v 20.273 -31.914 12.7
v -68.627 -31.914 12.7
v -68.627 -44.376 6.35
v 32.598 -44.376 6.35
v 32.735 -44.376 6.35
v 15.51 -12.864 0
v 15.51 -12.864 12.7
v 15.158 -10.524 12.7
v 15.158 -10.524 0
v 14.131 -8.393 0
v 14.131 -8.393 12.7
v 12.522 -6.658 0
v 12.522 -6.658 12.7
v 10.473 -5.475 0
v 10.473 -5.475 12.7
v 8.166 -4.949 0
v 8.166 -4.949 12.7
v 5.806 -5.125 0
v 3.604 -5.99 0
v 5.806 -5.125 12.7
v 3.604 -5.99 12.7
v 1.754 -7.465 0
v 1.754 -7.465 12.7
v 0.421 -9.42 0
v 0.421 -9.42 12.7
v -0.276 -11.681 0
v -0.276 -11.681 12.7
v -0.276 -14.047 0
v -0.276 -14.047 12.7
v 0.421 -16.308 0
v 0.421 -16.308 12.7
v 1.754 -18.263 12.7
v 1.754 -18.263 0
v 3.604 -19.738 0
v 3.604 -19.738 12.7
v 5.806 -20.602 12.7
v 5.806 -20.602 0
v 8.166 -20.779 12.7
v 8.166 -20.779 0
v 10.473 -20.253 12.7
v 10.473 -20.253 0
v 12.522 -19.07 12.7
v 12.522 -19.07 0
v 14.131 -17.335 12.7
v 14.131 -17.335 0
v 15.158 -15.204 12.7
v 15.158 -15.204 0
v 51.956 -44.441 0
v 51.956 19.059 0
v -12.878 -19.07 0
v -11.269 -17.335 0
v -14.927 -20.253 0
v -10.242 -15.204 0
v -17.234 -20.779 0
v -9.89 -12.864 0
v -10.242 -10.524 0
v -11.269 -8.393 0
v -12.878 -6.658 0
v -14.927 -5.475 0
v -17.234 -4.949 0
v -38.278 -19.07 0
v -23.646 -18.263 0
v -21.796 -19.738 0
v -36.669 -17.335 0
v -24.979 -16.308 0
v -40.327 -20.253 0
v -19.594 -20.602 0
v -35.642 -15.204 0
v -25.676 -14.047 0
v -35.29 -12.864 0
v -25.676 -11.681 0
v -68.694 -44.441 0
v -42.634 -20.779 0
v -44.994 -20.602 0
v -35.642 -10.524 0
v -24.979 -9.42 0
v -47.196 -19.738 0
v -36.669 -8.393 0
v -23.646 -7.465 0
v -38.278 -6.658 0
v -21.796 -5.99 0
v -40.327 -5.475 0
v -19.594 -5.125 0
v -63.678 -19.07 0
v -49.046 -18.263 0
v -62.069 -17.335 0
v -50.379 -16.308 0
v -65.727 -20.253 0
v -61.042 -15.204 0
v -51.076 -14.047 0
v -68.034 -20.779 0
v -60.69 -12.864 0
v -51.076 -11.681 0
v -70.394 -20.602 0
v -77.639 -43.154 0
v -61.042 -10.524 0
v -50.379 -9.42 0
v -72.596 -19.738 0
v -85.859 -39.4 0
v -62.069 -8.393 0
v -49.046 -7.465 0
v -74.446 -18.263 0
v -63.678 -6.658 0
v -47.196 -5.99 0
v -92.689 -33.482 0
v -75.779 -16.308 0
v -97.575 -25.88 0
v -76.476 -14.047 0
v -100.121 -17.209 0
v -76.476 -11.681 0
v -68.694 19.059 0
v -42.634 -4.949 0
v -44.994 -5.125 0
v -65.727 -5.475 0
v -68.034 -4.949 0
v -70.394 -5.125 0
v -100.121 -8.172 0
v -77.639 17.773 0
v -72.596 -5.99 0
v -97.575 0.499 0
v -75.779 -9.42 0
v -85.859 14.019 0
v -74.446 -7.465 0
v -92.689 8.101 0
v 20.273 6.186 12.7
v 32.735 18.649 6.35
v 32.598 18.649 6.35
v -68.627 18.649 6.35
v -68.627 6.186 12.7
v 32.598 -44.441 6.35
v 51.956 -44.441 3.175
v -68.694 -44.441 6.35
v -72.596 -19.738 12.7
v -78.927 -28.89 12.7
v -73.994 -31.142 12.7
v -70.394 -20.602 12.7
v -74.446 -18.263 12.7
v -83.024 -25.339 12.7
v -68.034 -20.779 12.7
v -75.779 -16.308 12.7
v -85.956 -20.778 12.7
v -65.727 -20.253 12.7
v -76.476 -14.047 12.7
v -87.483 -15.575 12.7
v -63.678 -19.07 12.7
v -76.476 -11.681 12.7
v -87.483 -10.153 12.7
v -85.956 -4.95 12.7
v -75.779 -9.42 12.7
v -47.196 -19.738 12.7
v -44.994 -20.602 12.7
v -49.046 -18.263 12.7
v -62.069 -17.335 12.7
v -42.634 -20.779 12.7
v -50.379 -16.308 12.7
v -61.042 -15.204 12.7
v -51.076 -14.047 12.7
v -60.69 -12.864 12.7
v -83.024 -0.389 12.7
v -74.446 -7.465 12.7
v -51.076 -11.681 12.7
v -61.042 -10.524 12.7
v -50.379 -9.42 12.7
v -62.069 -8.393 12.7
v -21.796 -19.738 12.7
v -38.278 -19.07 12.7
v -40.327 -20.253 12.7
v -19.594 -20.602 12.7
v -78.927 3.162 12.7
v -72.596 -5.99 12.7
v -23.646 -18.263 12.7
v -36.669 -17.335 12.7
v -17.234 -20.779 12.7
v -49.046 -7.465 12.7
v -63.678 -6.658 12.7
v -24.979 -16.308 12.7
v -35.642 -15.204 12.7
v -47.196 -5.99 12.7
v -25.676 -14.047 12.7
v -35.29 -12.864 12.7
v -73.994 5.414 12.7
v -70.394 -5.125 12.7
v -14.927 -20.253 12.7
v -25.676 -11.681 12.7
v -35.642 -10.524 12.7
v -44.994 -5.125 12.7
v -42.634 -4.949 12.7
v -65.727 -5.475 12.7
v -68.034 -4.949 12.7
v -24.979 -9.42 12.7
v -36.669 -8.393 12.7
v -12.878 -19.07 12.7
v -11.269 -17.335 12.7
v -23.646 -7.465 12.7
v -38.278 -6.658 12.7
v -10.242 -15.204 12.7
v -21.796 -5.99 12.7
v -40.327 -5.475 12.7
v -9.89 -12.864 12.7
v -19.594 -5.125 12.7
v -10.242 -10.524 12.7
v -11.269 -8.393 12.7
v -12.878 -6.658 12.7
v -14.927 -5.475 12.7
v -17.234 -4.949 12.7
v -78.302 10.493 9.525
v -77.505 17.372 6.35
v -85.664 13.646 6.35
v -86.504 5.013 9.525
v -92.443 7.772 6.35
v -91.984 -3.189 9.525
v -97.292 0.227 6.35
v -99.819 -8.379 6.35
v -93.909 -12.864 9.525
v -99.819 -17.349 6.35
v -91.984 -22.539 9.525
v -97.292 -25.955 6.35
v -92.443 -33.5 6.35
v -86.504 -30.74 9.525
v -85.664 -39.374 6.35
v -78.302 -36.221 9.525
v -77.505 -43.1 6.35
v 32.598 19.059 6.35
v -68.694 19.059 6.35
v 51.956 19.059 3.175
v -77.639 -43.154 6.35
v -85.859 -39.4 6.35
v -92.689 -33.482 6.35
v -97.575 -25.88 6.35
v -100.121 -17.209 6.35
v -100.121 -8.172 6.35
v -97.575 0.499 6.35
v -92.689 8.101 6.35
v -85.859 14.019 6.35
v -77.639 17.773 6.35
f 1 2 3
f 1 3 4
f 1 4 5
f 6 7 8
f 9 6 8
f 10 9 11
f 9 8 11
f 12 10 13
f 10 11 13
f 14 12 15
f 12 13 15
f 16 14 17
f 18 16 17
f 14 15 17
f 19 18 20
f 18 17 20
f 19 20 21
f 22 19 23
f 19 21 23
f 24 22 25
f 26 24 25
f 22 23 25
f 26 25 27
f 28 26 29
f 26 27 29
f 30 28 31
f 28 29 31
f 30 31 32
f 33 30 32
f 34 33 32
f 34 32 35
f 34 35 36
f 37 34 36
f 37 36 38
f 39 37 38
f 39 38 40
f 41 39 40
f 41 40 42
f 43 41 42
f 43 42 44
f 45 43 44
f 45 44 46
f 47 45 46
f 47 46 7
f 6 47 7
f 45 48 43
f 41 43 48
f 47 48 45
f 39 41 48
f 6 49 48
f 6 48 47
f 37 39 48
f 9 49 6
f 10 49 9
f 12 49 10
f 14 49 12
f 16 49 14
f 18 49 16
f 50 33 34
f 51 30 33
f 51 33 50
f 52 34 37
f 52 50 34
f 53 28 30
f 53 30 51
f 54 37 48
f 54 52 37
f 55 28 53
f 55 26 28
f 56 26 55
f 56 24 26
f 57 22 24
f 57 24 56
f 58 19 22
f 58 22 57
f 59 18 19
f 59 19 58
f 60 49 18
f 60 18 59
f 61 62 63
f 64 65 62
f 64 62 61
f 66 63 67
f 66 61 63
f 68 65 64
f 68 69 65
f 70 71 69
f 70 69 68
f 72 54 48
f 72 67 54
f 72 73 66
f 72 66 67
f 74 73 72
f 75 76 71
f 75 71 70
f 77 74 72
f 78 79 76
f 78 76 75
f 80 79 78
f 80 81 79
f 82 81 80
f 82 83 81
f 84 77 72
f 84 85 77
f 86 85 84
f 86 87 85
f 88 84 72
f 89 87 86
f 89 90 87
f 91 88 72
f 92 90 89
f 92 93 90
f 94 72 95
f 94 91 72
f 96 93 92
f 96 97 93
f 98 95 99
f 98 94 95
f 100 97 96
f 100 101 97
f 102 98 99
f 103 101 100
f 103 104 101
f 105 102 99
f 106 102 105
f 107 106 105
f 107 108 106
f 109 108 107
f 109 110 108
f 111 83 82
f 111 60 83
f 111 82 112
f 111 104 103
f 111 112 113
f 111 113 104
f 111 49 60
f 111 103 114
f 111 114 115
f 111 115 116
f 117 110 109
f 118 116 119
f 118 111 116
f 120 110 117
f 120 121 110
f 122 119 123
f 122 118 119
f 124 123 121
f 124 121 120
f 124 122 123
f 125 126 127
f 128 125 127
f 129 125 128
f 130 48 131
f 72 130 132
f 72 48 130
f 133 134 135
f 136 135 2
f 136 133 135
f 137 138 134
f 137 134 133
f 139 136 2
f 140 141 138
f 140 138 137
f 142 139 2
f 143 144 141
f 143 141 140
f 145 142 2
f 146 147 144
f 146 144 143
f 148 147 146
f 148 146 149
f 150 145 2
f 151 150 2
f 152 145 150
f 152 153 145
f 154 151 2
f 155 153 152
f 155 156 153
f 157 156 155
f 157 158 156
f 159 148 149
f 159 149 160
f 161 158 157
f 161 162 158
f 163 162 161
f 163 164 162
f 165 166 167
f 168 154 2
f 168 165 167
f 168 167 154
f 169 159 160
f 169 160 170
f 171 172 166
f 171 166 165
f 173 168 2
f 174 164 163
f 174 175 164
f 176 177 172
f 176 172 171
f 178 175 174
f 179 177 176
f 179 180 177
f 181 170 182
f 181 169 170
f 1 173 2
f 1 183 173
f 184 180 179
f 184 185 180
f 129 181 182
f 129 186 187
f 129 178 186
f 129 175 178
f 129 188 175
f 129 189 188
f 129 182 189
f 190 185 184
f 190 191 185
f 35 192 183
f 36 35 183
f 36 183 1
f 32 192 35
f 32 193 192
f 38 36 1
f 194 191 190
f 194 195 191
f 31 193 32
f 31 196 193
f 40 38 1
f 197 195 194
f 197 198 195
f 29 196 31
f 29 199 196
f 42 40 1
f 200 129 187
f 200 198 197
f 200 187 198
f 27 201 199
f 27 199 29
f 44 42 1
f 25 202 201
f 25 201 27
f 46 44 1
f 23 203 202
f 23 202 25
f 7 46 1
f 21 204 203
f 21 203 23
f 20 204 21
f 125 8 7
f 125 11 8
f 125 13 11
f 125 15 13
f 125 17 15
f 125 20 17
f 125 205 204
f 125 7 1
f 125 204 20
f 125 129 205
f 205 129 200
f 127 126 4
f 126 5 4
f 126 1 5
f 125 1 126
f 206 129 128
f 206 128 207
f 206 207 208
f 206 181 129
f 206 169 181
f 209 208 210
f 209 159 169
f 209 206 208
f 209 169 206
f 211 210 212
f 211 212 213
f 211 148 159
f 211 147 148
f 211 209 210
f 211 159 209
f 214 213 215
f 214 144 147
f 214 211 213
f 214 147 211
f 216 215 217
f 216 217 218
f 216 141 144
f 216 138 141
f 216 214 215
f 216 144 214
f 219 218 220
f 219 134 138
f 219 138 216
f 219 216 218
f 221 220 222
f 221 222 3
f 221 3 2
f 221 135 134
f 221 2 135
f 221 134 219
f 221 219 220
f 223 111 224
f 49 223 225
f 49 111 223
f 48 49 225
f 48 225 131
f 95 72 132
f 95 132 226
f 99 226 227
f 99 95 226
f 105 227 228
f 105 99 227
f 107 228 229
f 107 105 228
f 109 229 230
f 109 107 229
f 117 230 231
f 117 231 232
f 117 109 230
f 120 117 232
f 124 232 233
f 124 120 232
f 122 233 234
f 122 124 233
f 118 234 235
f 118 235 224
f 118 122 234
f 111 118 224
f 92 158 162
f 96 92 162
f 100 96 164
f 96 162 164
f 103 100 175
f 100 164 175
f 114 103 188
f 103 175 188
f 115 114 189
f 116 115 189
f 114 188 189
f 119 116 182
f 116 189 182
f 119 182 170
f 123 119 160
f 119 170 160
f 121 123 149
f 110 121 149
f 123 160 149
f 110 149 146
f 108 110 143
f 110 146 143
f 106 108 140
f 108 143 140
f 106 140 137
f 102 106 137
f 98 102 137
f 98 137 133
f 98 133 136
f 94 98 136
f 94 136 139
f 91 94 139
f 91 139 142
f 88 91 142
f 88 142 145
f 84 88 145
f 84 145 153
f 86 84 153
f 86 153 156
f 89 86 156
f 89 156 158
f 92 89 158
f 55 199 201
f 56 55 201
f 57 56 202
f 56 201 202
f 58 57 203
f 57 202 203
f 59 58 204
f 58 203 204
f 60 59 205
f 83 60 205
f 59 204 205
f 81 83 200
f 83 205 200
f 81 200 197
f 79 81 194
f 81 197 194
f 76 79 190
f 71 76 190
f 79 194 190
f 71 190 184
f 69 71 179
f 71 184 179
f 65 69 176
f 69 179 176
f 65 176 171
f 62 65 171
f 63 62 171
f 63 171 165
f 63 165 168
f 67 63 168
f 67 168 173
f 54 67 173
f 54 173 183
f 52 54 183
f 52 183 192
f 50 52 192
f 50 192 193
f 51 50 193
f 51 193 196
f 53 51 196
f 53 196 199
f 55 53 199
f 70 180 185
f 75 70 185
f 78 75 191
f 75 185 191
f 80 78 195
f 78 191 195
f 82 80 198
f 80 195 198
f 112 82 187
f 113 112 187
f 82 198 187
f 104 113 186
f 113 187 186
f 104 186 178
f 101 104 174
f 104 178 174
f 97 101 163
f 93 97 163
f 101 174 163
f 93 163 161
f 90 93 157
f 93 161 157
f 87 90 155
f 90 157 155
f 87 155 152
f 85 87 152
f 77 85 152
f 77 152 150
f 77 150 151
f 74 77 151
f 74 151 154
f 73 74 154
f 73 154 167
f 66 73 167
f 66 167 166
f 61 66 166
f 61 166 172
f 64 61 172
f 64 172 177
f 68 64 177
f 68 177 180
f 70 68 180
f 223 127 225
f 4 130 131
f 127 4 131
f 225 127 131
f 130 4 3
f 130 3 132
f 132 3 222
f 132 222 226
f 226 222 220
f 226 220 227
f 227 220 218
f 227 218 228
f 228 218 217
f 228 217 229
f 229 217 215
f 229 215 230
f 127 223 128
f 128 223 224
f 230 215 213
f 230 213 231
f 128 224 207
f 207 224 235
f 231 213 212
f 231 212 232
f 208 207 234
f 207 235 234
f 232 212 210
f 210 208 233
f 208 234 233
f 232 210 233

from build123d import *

# Parameters (mm, degrees)
BOSS_EXTRUDE1_DEPTH = 6.35
BOSS_EXTRUDE2_DEPTH = 6.35
BOSS_EXTRUDE2_DRAFT = 63
CUT_EXTRUDE1_DEPTH  = 63.5
SKETCH4_R           = 7.9375
CUT_EXTRUDE2_DEPTH  = 254


with BuildPart() as part:
    # Sketch1 → Boss-Extrude1 (new body)
    with BuildSketch(Plane.XY):
        with BuildLine():
            Line((-68.693731343, 19.059477612), (51.956268657, 19.059477612))
            Line((51.956268657, 19.059477612), (51.956268657, -44.440522388))
            Line((51.956268657, -44.440522388), (-68.693731343, -44.440522388))
            ThreePointArc((-68.693731343, -44.440522388), (-100.443731343, -12.690522388), (-68.693731343, 19.059477612))
        make_face()
    extrude(amount=BOSS_EXTRUDE1_DEPTH)


with BuildPart() as boss_extrude2_tool:
    # 3DSketch1 → Boss-Extrude2 (with draft: the straight prism first)
    with BuildSketch(Plane(origin=(-68.627300229, -31.913895704, 12.7), x_dir=(0.9191450300180579, 0.39391929857916763, 0), z_dir=(0, 0, 1))):
        with BuildLine():
            Line((0, 0), (81.711993169, -35.019425644))
            Line((81.711993169, -35.019425644), (96.720318444, 0))
            Line((96.720318444, 0), (15.008325276, 35.019425644))
            ThreePointArc((15.008325276, 35.019425644), (-10.005550184, 25.01387546), (0, 0))
        make_face()
    extrude(amount=-BOSS_EXTRUDE2_DEPTH)
    # Boss-Extrude2: the draft: its side faces are tilted about the plane it starts from
    boss_extrude2_sides = [boss_extrude2_tool.faces().sort_by_distance(p)[0] for p in [
        (-87.677300229, -12.863895704, 9.525),
        (-24.177300229, -31.913895704, 9.525),
        (20.272699771, -12.863895704, 9.525),
        (-24.177300229, 6.186104296, 9.525),
    ]]
    draft(boss_extrude2_sides, Plane(origin=(-68.627300229, -31.913895704, 12.7), x_dir=(0.9191450300180579, 0.39391929857916763, 0), z_dir=(0, 0, 1)), BOSS_EXTRUDE2_DRAFT)


with BuildPart() as part_1:
    add(part.part)

    # Boss-Extrude2: add boss_extrude2_tool
    add(boss_extrude2_tool.part)

    # Sketch3 → Cut-Extrude1 (cut)
    with BuildSketch(Plane.XZ.offset(44.440522388)):
        Polygon((32.598411505, 6.35), (51.956268657, 3.175), (51.956268657, 6.35), align=None)
    extrude(amount=-CUT_EXTRUDE1_DEPTH, mode=Mode.SUBTRACT)

    # Sketch4 → Cut-Extrude2 (cut)
    with BuildSketch(Plane.XY.offset(12.7)):
        with Locations((-68.627300229, -12.863895704)):
            Circle(SKETCH4_R)
        with Locations((-43.227300229, -12.863895704)):
            Circle(SKETCH4_R)
        with Locations((-17.827300229, -12.863895704)):
            Circle(SKETCH4_R)
        with Locations((7.572699771, -12.863895704)):
            Circle(SKETCH4_R)
    extrude(amount=-CUT_EXTRUDE2_DEPTH, mode=Mode.SUBTRACT)


solid = part_1.part
